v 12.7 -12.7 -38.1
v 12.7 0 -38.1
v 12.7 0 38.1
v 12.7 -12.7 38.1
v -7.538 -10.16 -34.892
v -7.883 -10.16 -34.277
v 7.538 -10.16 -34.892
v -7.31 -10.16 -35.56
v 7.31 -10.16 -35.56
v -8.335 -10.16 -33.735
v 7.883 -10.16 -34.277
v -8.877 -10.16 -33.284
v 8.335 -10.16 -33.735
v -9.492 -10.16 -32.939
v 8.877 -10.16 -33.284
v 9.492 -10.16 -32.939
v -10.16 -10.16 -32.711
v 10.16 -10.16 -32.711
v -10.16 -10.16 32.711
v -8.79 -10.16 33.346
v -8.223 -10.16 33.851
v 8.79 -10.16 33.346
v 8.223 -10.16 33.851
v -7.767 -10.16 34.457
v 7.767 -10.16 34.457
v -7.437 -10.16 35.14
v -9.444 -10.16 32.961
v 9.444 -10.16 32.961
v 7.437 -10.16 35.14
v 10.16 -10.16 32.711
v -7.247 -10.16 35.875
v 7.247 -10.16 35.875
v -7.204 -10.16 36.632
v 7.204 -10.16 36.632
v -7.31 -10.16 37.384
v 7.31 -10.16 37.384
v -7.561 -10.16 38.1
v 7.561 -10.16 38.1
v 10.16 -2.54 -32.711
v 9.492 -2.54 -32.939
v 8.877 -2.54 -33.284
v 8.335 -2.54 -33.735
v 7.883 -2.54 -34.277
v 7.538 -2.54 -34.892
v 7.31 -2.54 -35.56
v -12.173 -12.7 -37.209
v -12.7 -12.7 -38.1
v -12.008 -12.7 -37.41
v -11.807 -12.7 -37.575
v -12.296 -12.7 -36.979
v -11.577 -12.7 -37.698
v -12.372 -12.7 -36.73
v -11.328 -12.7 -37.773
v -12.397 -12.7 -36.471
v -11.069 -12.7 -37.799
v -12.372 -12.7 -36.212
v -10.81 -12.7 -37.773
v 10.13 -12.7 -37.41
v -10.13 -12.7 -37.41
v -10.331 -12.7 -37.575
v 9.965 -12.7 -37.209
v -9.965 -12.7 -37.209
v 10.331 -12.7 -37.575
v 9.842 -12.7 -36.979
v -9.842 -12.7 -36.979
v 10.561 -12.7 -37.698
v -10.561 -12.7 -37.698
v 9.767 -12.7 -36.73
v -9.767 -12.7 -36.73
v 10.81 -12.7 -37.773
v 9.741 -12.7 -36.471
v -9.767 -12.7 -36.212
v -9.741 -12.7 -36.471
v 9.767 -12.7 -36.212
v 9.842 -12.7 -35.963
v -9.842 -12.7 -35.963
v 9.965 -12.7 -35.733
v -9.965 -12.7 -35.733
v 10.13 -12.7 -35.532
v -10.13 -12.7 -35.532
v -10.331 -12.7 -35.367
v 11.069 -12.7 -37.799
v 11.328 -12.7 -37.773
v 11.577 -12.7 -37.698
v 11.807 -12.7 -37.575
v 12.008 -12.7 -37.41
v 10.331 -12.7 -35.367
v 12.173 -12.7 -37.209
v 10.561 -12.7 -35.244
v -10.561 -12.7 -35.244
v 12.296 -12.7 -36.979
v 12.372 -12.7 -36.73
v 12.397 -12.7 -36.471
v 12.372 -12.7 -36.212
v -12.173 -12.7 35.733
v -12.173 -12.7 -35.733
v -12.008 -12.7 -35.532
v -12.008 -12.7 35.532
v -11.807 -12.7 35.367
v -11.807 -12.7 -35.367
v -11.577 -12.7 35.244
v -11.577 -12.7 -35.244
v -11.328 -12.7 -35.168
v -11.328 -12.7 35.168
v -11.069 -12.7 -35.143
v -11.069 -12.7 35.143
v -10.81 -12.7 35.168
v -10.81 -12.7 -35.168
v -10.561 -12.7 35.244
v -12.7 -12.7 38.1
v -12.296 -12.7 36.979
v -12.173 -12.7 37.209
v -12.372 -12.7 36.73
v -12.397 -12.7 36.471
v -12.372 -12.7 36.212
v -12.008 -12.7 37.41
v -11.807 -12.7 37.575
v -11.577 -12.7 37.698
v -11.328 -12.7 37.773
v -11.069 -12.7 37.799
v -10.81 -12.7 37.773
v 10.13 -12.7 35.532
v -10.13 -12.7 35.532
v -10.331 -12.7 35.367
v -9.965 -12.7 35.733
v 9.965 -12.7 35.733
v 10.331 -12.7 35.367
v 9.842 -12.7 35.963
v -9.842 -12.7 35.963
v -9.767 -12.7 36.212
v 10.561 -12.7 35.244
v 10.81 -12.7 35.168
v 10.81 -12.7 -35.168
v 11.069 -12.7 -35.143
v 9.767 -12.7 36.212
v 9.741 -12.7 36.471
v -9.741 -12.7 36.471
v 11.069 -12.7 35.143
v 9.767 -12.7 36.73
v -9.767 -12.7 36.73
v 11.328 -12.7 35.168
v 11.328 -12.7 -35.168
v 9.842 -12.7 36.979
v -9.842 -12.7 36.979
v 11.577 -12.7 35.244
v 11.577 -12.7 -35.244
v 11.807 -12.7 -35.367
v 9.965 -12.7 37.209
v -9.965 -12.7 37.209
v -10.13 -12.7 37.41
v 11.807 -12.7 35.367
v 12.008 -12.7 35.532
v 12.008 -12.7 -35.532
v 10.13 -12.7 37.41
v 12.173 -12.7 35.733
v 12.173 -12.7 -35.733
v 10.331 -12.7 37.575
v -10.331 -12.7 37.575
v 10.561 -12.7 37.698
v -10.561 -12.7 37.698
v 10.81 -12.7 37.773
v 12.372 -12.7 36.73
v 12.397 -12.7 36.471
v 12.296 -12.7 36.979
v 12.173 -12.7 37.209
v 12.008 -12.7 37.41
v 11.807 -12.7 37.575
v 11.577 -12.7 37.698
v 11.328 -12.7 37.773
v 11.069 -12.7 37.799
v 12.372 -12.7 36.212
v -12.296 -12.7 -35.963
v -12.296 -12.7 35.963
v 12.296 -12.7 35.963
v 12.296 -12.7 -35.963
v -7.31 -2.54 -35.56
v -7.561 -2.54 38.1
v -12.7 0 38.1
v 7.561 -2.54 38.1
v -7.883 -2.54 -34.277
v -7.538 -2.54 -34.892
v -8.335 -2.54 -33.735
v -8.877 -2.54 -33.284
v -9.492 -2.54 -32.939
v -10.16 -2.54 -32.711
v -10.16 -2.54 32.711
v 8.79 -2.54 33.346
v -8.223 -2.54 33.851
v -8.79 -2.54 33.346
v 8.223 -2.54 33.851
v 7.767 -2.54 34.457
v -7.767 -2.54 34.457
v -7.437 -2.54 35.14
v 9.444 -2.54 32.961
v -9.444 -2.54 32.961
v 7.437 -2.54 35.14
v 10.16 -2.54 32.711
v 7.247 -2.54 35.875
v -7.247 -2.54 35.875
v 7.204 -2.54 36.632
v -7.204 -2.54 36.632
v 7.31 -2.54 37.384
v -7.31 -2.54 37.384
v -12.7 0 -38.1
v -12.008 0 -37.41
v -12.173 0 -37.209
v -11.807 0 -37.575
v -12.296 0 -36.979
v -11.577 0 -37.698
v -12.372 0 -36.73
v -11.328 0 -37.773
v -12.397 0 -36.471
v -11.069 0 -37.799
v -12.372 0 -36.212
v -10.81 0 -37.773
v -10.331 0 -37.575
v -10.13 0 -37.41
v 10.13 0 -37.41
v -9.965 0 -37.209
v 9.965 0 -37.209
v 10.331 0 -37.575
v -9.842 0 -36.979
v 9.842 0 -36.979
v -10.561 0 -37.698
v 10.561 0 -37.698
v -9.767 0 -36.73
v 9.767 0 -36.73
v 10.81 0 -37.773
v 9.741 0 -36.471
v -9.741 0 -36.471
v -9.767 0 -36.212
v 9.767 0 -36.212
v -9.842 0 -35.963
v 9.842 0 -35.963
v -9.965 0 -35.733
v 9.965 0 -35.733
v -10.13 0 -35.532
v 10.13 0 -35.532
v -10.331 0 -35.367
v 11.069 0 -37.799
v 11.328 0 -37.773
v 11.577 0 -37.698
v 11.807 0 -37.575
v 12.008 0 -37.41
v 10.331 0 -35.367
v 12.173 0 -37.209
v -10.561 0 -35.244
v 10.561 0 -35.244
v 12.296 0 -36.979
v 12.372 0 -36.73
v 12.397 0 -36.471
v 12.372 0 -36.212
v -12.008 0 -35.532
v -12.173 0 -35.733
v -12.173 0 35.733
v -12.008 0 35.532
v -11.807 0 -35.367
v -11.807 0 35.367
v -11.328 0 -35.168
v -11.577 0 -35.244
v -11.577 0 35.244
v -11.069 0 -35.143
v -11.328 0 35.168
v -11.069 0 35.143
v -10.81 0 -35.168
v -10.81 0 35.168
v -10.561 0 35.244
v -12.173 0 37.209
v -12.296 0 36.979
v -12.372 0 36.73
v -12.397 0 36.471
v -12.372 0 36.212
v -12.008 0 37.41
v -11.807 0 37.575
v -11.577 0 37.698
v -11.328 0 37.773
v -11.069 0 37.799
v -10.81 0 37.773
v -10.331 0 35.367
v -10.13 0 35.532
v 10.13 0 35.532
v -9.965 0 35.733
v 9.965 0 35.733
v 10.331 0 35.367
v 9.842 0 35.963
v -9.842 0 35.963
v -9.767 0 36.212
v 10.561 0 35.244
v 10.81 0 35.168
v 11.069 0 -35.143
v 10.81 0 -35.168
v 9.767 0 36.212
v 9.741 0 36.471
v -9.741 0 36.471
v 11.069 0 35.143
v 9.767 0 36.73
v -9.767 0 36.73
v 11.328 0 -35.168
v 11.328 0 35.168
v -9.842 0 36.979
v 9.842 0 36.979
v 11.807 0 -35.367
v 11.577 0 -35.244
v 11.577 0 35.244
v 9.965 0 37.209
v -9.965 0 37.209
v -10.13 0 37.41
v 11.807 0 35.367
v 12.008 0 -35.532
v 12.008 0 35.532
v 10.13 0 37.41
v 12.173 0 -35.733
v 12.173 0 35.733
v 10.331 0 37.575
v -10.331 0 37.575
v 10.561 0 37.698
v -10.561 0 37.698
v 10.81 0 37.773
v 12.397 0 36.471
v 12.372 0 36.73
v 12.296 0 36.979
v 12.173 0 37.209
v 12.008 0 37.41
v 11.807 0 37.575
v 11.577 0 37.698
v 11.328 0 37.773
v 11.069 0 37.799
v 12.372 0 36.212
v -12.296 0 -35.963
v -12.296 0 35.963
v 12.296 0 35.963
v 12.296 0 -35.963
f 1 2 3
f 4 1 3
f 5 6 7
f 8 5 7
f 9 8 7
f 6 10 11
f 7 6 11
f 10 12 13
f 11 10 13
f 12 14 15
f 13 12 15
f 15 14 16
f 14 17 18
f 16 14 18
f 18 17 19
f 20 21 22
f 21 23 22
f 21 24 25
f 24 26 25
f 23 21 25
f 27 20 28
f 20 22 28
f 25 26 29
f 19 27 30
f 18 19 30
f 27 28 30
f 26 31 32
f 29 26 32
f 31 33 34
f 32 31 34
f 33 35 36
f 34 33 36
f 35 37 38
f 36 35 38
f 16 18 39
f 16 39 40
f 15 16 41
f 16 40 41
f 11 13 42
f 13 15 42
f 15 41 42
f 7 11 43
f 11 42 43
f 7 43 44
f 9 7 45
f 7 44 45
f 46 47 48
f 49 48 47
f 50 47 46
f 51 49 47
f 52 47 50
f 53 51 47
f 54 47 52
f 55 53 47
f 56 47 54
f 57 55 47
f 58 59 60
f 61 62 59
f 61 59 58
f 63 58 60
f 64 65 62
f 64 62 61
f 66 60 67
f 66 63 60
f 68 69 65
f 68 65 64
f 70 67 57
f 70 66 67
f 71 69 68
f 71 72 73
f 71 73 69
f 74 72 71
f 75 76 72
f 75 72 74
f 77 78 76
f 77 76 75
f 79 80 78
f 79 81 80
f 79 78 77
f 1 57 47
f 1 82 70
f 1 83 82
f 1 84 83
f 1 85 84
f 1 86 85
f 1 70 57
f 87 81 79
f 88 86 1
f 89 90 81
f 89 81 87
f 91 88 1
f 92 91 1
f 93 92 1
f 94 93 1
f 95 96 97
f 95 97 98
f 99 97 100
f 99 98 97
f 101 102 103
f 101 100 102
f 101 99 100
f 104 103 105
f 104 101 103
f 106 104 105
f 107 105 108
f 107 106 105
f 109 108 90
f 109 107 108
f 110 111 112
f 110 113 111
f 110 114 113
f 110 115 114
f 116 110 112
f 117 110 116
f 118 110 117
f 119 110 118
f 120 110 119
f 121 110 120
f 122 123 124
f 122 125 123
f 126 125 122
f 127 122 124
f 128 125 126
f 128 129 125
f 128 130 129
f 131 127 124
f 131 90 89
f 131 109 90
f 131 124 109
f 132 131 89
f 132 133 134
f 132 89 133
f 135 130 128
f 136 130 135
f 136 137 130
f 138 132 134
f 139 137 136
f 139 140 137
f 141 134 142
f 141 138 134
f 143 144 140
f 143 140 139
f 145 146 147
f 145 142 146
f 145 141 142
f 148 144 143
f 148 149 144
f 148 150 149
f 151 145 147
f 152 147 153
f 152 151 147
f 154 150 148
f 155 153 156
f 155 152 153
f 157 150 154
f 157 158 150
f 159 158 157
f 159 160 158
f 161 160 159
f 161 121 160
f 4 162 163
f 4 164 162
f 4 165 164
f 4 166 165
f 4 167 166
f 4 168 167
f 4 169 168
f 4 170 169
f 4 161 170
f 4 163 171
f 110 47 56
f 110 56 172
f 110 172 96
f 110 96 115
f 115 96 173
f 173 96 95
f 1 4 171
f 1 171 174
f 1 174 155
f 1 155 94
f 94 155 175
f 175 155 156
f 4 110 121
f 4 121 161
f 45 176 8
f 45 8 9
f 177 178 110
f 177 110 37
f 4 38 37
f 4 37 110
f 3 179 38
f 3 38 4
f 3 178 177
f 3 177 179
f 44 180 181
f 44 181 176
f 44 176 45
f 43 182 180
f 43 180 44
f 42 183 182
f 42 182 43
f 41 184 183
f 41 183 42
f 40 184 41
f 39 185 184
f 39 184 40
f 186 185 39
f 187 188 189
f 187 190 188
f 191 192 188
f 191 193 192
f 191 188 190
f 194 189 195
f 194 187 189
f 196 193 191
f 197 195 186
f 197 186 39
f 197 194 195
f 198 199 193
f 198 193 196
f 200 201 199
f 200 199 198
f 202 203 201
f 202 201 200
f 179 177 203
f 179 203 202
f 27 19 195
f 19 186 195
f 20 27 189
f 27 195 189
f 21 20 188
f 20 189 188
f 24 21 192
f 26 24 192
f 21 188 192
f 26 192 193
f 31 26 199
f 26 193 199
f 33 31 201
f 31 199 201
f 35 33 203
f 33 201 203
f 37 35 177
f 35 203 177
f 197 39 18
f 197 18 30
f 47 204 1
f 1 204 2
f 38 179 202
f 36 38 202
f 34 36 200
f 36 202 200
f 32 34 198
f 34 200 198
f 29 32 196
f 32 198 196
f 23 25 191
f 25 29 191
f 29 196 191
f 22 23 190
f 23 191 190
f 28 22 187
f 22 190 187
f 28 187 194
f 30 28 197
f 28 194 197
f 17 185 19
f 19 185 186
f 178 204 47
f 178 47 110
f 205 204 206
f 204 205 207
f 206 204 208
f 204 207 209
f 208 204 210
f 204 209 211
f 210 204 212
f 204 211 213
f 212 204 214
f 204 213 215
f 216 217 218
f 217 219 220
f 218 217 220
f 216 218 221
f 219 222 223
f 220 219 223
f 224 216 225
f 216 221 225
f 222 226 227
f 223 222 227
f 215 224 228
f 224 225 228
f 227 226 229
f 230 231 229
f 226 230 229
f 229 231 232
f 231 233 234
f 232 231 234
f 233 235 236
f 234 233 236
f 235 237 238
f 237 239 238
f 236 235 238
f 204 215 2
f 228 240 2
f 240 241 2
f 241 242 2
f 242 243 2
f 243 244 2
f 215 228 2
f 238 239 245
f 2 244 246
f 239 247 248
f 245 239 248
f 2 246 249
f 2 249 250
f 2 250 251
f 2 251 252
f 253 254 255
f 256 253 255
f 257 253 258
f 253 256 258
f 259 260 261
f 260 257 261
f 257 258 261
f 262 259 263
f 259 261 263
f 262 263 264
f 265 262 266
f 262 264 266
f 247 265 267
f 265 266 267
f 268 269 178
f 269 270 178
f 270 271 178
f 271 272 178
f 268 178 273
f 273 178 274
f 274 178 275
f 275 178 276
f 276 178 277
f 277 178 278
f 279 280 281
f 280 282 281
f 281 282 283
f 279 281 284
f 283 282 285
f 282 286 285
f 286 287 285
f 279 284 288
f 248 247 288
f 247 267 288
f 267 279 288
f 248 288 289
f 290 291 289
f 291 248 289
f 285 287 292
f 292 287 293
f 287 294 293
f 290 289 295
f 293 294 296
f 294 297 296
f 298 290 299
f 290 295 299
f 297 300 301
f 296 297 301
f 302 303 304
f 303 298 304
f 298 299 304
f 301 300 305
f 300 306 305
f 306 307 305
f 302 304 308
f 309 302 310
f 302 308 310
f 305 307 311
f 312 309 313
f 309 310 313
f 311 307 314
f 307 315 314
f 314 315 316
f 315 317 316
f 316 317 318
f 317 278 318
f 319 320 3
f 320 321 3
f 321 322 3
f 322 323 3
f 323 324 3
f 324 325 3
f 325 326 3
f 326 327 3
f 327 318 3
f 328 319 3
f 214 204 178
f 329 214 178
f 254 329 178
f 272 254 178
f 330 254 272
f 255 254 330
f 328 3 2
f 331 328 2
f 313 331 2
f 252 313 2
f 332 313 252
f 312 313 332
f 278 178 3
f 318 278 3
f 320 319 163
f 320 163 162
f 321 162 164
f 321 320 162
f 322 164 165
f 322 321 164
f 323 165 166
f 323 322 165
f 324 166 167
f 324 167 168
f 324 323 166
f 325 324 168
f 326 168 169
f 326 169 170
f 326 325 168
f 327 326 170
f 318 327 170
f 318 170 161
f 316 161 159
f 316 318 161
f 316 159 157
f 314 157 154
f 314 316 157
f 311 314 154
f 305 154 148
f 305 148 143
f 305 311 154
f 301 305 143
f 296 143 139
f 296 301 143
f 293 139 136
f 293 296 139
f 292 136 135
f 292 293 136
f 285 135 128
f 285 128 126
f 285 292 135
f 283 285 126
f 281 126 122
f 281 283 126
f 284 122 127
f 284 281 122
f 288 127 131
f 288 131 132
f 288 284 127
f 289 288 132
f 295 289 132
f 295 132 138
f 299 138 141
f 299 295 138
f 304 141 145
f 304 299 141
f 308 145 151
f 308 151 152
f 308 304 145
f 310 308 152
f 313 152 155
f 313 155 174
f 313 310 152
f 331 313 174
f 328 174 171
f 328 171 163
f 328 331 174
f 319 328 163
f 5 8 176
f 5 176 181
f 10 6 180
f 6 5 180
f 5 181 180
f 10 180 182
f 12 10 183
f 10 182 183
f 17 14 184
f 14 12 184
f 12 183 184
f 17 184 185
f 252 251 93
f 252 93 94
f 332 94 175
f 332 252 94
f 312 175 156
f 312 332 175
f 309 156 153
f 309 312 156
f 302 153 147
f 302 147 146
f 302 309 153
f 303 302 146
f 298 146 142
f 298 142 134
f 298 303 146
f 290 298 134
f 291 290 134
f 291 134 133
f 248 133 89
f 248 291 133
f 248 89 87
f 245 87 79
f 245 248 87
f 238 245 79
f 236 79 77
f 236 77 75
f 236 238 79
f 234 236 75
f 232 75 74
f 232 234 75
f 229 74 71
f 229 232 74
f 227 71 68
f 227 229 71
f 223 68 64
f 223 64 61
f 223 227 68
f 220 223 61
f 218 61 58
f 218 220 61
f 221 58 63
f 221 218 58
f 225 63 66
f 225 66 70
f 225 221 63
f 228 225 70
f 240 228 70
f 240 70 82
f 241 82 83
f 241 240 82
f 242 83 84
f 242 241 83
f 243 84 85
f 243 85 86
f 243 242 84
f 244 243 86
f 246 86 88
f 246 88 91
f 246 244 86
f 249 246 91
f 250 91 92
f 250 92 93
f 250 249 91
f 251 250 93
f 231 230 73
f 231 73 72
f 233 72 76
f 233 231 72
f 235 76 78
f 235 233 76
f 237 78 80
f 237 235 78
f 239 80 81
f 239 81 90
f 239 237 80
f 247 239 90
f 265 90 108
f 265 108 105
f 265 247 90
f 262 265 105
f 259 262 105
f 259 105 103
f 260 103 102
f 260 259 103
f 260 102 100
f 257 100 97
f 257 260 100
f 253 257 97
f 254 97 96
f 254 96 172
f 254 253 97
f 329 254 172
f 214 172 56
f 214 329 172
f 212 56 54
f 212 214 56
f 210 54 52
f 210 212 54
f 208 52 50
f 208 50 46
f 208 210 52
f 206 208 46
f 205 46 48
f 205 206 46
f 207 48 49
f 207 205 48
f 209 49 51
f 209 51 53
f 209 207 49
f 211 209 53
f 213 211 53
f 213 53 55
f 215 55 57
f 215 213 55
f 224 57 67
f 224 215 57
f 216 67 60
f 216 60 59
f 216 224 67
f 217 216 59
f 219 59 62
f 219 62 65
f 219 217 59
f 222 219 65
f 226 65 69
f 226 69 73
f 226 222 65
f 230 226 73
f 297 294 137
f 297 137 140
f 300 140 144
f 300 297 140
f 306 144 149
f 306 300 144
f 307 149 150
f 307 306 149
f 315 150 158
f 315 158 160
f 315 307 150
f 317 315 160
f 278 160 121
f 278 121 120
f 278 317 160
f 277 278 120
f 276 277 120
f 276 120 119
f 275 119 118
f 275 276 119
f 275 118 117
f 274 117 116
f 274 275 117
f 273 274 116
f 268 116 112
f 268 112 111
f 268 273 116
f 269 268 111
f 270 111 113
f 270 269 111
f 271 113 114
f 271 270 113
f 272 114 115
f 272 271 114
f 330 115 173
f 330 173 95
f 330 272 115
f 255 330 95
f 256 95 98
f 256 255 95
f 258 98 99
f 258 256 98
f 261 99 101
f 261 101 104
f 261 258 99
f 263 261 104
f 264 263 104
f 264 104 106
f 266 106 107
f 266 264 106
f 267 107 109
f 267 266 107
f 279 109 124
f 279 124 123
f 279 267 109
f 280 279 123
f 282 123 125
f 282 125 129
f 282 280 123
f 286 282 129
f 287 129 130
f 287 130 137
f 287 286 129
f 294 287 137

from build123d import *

# Parameters (mm, degrees)
F0_W     = 25.4
F0_H     = 76.2
F0_R     = 1.328071913
F1_DEPTH = 12.7
F2_T     = 2.54


# Not quite as in the source:
# - a shell that OpenCascade refuses in one call is made with other operations: the cavity is built on its own and cut out


with BuildPart() as f1:
    # F0 (on Front) → F1 (new body)
    with BuildSketch(Plane.XZ):
        Rectangle(F0_W, F0_H)
        with Locations((-11.0691860318, -36.4708118141)):
            Circle(F0_R, mode=Mode.SUBTRACT)
        with Locations((11.0691860318, -36.4708118141)):
            Circle(F0_R, mode=Mode.SUBTRACT)
        with Locations((-11.0691860318, 36.4708118141)):
            Circle(F0_R, mode=Mode.SUBTRACT)
        with Locations((11.0691860318, 36.4708118141)):
            Circle(F0_R, mode=Mode.SUBTRACT)
    extrude(amount=F1_DEPTH)

    # F2: shell of thickness 2.54, made by hand


with BuildPart() as f2_core1:
    # F2_t2: copy of F1
    add(f1.part)

    # the walls: a layer under each face that stays
    f2_faces = [f2_core1.faces().sort_by_distance(p)[0] for p in [
        (12.7, -6.35, 0),
        (-12.7, -6.35, 0),
        (0, -6.35, -38.1),
        (-12.3972579448, -6.35, -36.4708118141),
        (9.7411141188, -6.35, -36.4708118141),
        (-12.3972579448, -6.35, 36.4708118141),
        (9.7411141188, -6.35, 36.4708118141),
        (0, 0, 0),
        (0, -12.7, 0),
    ]]
    thicken(f2_faces, amount=-F2_T, mode=Mode.SUBTRACT)


with BuildPart() as f1_1:
    add(f1.part)

    # what is left inside the walls is the cavity
    f2_cavity = [f2_core1.part.solids().sort_by_distance(p)[0] for p in [
        (0, -2.5654, -11.006667),
    ]]
    add(f2_cavity, mode=Mode.SUBTRACT)


solid = f1_1.part
